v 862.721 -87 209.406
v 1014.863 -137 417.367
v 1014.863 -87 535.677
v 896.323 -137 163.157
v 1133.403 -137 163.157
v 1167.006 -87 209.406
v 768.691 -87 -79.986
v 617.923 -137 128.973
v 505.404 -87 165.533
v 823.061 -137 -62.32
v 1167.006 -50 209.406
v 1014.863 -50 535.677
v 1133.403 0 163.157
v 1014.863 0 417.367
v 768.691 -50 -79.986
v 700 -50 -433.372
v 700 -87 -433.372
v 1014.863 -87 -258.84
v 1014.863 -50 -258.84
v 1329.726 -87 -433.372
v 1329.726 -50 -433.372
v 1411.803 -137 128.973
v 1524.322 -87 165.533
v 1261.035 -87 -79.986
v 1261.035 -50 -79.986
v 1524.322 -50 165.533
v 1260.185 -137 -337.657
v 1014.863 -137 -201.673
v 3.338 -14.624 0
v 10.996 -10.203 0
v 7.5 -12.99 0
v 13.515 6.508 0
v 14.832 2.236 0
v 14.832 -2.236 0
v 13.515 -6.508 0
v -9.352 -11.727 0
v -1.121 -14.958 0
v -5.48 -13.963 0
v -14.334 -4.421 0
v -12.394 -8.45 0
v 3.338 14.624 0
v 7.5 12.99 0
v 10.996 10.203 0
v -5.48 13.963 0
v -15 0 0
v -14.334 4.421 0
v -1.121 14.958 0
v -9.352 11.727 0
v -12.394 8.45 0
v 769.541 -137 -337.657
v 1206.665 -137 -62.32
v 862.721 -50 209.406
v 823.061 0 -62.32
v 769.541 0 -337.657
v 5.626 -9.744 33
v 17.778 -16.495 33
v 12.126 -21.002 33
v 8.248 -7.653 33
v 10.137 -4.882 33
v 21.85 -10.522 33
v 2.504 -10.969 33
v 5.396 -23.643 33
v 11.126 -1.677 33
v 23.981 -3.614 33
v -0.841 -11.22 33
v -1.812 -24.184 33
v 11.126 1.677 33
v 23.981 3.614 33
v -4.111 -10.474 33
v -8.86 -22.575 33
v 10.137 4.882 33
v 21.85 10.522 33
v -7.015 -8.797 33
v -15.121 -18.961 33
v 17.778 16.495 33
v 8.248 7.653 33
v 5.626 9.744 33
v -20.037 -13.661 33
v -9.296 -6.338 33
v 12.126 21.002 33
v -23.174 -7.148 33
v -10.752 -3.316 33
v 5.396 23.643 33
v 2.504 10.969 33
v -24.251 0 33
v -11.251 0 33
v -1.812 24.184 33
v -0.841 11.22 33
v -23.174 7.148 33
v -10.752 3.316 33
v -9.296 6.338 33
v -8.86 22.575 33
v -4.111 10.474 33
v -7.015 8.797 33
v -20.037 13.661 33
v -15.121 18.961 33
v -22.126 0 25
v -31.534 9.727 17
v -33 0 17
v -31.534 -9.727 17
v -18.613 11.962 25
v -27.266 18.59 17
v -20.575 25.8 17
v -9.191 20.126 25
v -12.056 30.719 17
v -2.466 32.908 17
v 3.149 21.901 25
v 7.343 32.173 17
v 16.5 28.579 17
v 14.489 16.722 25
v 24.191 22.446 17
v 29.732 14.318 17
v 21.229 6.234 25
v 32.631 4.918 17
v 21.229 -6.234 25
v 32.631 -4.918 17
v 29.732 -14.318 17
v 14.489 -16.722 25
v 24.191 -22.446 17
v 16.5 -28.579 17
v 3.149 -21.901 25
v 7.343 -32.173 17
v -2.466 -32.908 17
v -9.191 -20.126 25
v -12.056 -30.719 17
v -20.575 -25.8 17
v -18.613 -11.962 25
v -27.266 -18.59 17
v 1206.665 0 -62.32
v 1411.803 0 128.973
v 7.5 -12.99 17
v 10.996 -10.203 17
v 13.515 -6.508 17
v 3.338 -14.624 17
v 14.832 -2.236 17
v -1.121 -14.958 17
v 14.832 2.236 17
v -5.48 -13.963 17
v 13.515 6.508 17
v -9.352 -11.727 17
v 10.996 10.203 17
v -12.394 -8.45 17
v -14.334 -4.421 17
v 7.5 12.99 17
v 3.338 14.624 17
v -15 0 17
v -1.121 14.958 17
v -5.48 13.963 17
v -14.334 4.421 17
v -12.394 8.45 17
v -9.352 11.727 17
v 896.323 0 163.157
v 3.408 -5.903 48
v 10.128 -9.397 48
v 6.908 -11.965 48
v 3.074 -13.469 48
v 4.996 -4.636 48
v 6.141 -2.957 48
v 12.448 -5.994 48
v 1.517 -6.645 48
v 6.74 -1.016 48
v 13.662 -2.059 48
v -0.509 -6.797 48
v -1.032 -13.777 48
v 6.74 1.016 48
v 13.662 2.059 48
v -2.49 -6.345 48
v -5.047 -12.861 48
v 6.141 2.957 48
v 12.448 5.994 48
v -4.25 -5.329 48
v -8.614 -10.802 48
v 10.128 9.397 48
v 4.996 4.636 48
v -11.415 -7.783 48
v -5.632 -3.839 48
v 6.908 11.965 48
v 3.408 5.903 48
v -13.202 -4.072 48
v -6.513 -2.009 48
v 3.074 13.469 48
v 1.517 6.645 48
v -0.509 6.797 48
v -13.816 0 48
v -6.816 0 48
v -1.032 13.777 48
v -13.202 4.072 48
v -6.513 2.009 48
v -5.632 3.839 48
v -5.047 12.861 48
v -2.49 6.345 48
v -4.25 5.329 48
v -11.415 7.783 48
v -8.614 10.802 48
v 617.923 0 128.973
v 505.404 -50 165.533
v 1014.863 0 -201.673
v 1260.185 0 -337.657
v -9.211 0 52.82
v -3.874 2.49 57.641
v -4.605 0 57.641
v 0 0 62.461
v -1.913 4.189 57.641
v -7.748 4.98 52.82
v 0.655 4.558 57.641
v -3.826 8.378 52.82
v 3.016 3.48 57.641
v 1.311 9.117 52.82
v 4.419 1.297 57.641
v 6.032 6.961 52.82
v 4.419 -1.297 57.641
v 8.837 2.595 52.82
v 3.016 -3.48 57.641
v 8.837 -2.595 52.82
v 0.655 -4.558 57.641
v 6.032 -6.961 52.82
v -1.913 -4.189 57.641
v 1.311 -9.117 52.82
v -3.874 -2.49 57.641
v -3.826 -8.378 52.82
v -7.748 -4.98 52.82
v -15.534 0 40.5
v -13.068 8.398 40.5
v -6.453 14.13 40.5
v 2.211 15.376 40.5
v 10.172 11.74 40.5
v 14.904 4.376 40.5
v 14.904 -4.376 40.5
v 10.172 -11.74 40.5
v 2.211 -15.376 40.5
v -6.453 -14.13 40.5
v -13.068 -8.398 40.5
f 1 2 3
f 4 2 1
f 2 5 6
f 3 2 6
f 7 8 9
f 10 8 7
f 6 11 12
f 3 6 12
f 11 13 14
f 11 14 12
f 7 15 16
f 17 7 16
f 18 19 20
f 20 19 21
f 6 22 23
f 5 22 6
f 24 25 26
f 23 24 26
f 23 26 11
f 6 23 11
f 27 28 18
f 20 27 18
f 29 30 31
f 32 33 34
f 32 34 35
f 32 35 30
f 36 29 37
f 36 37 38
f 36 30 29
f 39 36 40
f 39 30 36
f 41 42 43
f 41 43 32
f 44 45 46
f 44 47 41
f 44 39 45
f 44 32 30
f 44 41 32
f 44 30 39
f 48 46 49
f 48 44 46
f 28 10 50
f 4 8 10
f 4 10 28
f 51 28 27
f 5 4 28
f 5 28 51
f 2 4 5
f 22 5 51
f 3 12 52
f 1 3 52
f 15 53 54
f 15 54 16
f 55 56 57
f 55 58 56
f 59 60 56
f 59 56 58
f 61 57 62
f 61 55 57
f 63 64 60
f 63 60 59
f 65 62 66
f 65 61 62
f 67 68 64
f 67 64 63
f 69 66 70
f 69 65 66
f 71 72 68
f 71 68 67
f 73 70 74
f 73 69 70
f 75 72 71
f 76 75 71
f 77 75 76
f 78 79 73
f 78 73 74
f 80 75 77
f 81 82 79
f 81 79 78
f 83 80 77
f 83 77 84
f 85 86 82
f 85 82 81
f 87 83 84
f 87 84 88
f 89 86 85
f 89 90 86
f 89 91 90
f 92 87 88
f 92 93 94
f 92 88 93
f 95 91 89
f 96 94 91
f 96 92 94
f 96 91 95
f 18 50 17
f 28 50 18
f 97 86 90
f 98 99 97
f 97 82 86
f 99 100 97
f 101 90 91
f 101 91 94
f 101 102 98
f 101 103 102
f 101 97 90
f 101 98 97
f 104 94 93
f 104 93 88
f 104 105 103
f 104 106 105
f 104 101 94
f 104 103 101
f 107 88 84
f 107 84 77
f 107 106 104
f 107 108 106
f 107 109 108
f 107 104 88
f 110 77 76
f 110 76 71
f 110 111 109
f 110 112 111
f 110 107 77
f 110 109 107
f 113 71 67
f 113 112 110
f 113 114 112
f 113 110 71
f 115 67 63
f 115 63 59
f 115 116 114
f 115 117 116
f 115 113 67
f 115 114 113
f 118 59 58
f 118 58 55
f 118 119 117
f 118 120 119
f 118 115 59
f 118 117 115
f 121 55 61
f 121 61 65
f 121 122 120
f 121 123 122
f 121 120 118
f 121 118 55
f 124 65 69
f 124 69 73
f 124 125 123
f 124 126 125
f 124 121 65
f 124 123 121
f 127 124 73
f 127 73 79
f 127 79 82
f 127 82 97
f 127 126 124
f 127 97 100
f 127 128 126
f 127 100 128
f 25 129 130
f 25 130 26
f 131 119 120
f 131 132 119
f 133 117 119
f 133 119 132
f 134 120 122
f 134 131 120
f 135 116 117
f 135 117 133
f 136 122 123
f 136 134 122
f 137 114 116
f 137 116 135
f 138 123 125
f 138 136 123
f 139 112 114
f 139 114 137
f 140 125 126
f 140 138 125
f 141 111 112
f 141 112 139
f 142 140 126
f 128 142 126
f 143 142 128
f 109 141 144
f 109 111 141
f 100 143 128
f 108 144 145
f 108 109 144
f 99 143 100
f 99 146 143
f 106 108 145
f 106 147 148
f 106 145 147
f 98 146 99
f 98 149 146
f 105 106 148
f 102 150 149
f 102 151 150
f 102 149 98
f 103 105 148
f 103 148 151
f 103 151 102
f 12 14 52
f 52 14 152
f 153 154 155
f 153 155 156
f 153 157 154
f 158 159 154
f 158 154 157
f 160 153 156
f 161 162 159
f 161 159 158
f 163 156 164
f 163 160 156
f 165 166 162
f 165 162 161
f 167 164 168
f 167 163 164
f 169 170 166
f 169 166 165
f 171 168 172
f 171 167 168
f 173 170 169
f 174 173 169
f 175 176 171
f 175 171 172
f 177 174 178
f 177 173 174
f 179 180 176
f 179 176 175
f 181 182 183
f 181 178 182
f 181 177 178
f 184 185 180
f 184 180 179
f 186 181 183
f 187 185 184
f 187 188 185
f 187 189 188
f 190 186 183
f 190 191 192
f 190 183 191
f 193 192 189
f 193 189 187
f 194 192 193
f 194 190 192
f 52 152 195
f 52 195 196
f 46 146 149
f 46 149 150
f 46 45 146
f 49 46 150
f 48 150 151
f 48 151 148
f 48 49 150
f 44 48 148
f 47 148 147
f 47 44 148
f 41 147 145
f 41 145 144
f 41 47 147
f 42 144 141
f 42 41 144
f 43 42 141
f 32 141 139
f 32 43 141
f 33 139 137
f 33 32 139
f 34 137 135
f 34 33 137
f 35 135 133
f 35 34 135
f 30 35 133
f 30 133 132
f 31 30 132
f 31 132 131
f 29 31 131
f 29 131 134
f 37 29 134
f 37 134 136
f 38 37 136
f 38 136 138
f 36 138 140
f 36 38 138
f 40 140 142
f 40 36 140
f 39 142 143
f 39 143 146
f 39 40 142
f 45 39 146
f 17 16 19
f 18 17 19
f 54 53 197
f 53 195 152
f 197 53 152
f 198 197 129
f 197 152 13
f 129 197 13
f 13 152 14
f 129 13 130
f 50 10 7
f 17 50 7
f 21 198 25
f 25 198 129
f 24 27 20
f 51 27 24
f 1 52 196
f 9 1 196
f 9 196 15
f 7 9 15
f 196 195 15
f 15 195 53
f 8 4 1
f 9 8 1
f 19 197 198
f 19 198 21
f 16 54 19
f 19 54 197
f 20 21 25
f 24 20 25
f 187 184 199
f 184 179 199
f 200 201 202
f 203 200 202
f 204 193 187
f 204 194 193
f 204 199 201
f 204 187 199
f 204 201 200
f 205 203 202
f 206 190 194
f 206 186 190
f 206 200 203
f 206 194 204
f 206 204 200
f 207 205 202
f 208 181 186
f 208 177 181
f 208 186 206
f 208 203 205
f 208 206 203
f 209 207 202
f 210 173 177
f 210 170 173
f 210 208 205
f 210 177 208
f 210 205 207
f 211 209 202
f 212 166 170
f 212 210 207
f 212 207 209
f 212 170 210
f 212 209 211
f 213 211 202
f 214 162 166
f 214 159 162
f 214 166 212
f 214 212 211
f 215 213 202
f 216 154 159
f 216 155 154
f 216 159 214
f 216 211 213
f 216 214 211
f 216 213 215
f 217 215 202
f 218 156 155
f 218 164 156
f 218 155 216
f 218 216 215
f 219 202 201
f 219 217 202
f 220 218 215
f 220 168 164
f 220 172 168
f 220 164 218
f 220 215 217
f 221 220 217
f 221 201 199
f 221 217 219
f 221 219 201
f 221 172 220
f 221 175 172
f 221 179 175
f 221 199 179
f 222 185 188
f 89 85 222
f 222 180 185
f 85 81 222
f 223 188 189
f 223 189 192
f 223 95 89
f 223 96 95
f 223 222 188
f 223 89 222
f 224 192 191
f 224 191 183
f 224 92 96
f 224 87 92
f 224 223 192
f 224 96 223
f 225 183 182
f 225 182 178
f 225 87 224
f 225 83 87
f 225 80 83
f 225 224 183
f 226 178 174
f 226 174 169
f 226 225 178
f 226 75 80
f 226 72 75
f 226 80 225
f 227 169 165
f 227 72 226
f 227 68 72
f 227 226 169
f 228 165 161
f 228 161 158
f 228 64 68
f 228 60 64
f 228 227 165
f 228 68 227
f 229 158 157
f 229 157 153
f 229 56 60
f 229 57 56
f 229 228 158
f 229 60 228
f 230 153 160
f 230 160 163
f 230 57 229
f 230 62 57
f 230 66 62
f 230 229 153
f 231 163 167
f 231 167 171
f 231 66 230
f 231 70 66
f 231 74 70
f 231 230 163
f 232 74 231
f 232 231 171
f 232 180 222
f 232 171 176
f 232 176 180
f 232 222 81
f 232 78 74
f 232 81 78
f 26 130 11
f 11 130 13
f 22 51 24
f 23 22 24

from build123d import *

# Parameters (mm, degrees)
F3_DEPTH = 137
F4_SIZE  = 50


with BuildPart() as f1:
    # F0 (on Front) → F1 (revolve)
    with BuildSketch(Plane.XZ):
        Polygon((-15, 0), (0, 0), (0, 62.46107), (-13.815841, 48), (-6.815841, 48), (-24.251437, 33), (-11.251437, 33), (-33, 17), (-15, 17), align=None)
    revolve(axis=Axis((0, 0, 31.230535), (0, 0, -1)))


with BuildPart() as f3:
    # F2 (on Front) → F3 (new body)
    with BuildSketch(Plane.XZ):
        Polygon((1167.005669, 209.406288), (1014.863095, 535.677092), (862.72052, 209.406288), (505.403906, 165.533325), (768.691238, -79.986085), (700, -433.371871), (1014.863095, -258.840408), (1329.726189, -433.371871), (1261.034951, -79.986085), (1524.322283, 165.533325), align=None)
    extrude(amount=F3_DEPTH)

    # F4
    f4_edges = [f3.edges().sort_by_distance(p)[0] for p in [
        (684.062213, -137, 187.469807),
        (684.062213, 0, 187.469807),
        (938.791807, -137, 372.54169),
        (938.791807, 0, 372.54169),
        (1345.663976, -137, 187.469807),
        (1345.663976, 0, 187.469807),
        (734.345619, -137, -256.678978),
        (734.345619, 0, -256.678978),
        (637.047572, -137, 42.77362),
        (637.047572, 0, 42.77362),
        (857.431547, -137, -346.106139),
        (1172.294642, -137, -346.106139),
        (1295.38057, -137, -256.678978),
        (1392.678617, -137, 42.77362),
        (1090.934382, -137, 372.54169),
        (1090.934382, 0, 372.54169),
        (1392.678617, 0, 42.77362),
        (1295.38057, 0, -256.678978),
        (857.431547, 0, -346.106139),
        (1172.294642, 0, -346.106139),
    ]]
    chamfer(f4_edges, length=F4_SIZE)


solid = Compound([f1.part, f3.part])
